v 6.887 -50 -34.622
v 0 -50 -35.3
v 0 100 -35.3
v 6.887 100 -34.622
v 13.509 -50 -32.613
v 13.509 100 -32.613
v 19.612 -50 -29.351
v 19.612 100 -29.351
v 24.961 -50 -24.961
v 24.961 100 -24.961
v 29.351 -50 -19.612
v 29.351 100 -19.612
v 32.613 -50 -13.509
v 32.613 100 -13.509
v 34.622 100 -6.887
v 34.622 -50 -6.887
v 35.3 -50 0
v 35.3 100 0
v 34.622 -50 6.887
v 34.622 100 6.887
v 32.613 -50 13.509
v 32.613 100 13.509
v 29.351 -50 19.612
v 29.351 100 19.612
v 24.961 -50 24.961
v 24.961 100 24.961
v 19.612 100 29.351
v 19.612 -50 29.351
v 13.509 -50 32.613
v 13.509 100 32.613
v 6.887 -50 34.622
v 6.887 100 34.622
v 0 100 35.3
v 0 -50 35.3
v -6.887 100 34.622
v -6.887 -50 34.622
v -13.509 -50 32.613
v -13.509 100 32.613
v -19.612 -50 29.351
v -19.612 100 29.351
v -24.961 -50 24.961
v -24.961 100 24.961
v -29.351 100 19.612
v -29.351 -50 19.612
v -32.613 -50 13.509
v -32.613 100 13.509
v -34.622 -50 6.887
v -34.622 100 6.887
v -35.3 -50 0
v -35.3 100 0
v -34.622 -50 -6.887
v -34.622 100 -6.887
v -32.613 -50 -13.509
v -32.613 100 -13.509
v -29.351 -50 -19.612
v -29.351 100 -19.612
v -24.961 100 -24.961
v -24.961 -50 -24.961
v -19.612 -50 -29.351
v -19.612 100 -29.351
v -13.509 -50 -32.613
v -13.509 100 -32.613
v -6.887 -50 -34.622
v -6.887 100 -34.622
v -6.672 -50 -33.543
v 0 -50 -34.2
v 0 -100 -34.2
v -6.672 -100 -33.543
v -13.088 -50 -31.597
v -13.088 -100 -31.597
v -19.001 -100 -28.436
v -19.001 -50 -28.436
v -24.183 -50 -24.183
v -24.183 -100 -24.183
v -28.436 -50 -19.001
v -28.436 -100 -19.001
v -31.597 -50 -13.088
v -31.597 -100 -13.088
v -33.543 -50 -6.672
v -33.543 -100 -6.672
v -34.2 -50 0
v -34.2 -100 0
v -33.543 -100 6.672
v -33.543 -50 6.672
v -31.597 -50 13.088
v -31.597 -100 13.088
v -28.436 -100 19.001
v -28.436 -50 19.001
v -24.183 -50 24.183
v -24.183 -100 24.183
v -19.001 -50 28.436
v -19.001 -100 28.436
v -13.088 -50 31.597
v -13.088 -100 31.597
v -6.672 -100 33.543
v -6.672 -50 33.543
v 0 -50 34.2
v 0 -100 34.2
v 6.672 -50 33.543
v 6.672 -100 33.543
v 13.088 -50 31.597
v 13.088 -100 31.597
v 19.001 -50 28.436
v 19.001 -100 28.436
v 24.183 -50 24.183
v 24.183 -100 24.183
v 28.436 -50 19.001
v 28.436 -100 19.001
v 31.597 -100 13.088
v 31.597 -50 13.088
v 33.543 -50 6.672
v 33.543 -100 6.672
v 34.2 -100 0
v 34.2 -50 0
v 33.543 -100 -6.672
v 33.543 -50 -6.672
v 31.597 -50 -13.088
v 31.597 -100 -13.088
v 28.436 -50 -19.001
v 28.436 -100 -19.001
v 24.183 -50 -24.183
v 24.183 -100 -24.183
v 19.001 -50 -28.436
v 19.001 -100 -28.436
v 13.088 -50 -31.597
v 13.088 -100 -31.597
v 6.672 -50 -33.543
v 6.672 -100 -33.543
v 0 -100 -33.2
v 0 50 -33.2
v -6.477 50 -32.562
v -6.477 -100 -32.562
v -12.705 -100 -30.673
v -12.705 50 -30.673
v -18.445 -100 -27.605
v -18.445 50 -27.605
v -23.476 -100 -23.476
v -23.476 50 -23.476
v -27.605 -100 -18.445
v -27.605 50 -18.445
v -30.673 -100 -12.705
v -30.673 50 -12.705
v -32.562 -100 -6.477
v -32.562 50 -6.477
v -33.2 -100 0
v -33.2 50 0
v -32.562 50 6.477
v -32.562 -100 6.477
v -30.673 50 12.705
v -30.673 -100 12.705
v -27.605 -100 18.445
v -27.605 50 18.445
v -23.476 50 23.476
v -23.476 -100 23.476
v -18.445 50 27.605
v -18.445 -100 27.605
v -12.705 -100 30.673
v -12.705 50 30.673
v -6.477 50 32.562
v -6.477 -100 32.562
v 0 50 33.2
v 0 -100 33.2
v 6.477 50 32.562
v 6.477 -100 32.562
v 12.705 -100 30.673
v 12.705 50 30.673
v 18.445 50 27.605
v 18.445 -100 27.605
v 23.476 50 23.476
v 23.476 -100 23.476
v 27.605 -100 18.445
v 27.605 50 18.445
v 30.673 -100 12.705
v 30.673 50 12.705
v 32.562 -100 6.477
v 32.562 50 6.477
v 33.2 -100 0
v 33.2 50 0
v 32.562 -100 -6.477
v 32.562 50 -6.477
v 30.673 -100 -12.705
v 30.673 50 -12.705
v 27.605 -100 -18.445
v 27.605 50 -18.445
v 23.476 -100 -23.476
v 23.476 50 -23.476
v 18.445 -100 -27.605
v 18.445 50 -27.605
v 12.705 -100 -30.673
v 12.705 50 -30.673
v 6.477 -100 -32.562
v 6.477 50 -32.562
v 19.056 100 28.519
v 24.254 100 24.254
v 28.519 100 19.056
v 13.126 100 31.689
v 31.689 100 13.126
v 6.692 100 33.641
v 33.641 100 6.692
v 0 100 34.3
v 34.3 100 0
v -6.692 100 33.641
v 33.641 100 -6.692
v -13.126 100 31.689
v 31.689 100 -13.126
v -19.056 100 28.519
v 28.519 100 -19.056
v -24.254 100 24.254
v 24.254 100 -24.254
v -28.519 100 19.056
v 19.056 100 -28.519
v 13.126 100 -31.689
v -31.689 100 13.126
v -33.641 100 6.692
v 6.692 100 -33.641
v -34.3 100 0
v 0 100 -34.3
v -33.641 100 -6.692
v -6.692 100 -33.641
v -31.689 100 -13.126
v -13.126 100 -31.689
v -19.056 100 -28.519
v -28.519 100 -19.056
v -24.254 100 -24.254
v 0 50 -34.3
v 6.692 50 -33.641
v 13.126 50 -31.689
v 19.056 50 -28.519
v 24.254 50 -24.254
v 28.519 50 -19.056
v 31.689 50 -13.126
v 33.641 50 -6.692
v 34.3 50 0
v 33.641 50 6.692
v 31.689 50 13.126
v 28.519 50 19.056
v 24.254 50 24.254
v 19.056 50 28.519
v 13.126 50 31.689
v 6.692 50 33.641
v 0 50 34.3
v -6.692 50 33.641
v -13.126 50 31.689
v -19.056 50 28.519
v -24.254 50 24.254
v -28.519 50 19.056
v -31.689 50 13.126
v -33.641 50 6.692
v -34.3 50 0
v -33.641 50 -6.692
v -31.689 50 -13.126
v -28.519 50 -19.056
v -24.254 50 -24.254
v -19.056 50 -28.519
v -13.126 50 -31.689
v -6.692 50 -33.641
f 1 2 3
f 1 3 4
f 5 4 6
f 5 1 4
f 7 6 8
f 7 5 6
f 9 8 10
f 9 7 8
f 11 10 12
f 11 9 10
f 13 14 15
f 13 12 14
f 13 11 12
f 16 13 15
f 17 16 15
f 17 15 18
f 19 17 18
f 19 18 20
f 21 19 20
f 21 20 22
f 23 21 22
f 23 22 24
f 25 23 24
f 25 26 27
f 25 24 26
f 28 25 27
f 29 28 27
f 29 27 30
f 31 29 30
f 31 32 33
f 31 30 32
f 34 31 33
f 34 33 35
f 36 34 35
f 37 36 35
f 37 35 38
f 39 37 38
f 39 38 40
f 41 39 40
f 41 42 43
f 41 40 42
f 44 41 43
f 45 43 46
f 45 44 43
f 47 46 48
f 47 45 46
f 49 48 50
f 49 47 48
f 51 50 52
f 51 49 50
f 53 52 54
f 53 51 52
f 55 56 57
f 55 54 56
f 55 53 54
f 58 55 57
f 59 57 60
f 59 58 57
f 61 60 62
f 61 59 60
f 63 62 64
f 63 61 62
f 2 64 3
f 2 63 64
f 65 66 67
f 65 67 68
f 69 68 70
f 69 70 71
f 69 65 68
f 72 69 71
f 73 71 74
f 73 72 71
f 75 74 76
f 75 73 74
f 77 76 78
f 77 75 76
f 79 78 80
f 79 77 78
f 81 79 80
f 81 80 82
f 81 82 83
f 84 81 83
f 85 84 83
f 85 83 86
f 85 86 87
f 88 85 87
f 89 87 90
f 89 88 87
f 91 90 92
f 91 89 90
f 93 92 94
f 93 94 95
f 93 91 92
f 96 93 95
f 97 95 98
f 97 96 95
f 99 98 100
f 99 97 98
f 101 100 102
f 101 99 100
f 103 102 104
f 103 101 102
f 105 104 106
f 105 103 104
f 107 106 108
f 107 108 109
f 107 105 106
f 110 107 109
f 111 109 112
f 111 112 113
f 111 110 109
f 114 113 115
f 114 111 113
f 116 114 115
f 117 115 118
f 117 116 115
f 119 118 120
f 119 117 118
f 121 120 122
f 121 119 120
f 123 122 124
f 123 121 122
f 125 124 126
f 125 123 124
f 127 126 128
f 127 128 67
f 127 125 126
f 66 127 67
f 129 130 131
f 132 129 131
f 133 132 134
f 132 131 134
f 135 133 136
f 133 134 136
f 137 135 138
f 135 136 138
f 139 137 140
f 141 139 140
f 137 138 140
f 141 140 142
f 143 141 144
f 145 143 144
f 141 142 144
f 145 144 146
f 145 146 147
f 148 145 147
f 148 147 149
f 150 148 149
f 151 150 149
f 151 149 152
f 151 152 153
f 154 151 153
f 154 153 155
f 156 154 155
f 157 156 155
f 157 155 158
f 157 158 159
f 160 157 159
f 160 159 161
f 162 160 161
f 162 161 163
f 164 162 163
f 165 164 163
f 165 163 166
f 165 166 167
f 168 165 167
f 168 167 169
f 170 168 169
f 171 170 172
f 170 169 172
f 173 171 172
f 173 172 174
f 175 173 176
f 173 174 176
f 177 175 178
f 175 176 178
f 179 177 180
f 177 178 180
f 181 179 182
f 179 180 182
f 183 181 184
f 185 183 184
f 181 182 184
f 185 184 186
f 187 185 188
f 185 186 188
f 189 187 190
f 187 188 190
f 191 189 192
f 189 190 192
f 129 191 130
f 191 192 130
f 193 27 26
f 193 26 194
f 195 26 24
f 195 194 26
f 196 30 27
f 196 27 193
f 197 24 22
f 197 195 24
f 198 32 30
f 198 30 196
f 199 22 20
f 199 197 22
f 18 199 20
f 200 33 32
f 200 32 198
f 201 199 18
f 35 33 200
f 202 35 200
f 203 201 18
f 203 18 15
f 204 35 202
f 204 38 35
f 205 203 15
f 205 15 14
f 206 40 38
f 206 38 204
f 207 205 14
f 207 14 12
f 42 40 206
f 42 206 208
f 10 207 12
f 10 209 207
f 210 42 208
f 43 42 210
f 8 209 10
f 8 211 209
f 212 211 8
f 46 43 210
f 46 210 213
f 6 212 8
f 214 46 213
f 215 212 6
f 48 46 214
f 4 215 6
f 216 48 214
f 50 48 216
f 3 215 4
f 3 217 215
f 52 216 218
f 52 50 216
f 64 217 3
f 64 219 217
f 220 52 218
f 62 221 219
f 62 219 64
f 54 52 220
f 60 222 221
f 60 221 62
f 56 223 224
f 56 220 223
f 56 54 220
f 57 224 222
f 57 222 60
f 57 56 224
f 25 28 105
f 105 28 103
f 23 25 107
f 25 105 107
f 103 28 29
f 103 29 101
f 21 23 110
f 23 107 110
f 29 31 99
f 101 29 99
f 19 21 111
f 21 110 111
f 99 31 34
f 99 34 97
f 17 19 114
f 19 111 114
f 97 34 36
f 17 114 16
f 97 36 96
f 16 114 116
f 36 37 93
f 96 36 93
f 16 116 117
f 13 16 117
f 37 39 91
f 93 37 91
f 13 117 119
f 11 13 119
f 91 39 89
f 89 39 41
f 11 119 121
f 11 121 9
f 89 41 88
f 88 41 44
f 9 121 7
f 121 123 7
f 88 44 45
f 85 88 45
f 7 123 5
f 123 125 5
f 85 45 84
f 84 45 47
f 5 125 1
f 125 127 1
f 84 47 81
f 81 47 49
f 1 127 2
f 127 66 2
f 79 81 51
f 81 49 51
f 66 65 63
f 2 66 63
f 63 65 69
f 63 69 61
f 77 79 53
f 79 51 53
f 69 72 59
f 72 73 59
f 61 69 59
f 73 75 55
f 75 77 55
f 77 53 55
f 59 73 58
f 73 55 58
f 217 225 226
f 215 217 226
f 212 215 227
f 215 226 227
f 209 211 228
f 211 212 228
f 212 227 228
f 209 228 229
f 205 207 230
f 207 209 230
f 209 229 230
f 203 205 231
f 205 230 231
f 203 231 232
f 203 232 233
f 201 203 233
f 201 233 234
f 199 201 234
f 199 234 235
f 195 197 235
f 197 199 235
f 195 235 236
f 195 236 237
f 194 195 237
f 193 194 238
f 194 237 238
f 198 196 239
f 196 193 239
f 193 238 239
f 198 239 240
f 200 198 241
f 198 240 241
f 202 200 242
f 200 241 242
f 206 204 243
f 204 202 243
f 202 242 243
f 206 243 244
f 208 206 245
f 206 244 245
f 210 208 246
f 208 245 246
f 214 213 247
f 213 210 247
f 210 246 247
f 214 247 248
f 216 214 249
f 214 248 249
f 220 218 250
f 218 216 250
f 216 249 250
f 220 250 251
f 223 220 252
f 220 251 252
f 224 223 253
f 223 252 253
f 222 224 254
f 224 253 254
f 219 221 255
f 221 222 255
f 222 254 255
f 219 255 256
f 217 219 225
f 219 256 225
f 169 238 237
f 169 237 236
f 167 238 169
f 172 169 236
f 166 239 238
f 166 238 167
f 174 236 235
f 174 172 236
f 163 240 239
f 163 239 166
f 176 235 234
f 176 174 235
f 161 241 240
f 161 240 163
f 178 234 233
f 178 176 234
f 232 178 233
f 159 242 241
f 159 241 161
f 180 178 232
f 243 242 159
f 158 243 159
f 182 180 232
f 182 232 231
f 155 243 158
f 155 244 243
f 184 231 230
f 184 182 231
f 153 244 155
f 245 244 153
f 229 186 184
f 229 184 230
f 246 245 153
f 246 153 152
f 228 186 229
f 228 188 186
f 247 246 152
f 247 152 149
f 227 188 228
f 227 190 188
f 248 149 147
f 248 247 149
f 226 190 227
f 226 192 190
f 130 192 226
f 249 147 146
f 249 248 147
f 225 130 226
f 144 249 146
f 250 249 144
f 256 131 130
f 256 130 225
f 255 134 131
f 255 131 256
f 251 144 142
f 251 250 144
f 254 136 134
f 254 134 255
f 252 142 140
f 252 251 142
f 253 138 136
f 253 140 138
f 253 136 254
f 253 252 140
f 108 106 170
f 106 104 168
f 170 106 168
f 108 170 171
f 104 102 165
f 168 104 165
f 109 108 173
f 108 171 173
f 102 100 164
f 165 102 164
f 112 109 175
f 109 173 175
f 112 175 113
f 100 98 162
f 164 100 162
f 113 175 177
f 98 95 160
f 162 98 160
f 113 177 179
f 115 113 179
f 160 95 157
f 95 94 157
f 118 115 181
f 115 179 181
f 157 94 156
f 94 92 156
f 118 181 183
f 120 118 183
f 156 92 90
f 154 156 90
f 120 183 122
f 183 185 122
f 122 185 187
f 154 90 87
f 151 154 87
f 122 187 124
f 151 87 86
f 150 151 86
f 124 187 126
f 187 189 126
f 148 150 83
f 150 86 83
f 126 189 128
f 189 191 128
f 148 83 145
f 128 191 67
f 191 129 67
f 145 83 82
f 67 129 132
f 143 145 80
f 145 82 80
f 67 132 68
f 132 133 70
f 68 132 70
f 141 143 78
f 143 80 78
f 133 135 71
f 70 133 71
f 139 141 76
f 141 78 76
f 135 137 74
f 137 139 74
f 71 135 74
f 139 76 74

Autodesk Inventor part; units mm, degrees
ref_plane "YZ Plane" through (0, 0, 0) normal (1, 0, 0) x (0, 1, 0)
ref_plane "XZ Plane" through (0, 0, 0) normal (0, 1, 0) x (-1, 0, 0)
ref_plane "XY Plane" through (0, 0, 0) normal (0, 0, 1) x (1, 0, 0)
sketch "Sketch1" plane through (0, 0, 0) normal (1, 0, 0) x (0, 1, 0)
  line L0 (-100, -33.2) -> (50, -33.2)
  line L1 (50, -33.2) -> (50, -34.3)
  line L2 (-100, -34.2) -> (-100, -33.2)
  line L3 (100, -34.3) -> (100, -35.3)
  line L4 (100, -35.3) -> (-50, -35.3)
  line L5 (-140, 0) -> (140, 0) projected
  line L6 (100, -34.3) -> (50, -34.3)
  line L7 (-100, -34.2) -> (-50, -34.2)
  line L8 (-50, -34.2) -> (-50, -35.3)
  point P0 (0, 0)
  point P1 (-100, -33.875)
  point P2 (100, -34.75)
  dimension "d6" = 33.2
  dimension "d7" = 50
  dimension "d9" = 200
  dimension "d13" = 2.1
  dimension "d16" = 100
  dimension "d26" = 1
  dimension "d27" = 1
  dimension "d28" = 34.3
  dimension "d29" = 34.2
revolve "Revolution1" add sketch "Sketch1" angle 360 about axis through (0, -10, 0) along (0, 1, 0)
sketch "Sketch2" plane through (0, 0, 0) normal (1, 0, 0) x (0, 1, 0)
  line L0 (71, 3) -> (65, 3)
  line L1 (65, 3) -> (65, -3)
  line L2 (65, -3) -> (71, -3)
  line L3 (71, -3) -> (71, 3)
  line L4 (100, -35.3) -> (100, 35.3) projected
  point P0 (0, 0)
  dimension "d17" = 3
  dimension "d18" = 3
  dimension "d19" = 6
  dimension "d20" = 29
extrude "Extrusion1" [suppressed]
equation "\"d16\" = 0.5 * d9"
equation "\"gap\" = 0.1"
properties part number "MidTube"
